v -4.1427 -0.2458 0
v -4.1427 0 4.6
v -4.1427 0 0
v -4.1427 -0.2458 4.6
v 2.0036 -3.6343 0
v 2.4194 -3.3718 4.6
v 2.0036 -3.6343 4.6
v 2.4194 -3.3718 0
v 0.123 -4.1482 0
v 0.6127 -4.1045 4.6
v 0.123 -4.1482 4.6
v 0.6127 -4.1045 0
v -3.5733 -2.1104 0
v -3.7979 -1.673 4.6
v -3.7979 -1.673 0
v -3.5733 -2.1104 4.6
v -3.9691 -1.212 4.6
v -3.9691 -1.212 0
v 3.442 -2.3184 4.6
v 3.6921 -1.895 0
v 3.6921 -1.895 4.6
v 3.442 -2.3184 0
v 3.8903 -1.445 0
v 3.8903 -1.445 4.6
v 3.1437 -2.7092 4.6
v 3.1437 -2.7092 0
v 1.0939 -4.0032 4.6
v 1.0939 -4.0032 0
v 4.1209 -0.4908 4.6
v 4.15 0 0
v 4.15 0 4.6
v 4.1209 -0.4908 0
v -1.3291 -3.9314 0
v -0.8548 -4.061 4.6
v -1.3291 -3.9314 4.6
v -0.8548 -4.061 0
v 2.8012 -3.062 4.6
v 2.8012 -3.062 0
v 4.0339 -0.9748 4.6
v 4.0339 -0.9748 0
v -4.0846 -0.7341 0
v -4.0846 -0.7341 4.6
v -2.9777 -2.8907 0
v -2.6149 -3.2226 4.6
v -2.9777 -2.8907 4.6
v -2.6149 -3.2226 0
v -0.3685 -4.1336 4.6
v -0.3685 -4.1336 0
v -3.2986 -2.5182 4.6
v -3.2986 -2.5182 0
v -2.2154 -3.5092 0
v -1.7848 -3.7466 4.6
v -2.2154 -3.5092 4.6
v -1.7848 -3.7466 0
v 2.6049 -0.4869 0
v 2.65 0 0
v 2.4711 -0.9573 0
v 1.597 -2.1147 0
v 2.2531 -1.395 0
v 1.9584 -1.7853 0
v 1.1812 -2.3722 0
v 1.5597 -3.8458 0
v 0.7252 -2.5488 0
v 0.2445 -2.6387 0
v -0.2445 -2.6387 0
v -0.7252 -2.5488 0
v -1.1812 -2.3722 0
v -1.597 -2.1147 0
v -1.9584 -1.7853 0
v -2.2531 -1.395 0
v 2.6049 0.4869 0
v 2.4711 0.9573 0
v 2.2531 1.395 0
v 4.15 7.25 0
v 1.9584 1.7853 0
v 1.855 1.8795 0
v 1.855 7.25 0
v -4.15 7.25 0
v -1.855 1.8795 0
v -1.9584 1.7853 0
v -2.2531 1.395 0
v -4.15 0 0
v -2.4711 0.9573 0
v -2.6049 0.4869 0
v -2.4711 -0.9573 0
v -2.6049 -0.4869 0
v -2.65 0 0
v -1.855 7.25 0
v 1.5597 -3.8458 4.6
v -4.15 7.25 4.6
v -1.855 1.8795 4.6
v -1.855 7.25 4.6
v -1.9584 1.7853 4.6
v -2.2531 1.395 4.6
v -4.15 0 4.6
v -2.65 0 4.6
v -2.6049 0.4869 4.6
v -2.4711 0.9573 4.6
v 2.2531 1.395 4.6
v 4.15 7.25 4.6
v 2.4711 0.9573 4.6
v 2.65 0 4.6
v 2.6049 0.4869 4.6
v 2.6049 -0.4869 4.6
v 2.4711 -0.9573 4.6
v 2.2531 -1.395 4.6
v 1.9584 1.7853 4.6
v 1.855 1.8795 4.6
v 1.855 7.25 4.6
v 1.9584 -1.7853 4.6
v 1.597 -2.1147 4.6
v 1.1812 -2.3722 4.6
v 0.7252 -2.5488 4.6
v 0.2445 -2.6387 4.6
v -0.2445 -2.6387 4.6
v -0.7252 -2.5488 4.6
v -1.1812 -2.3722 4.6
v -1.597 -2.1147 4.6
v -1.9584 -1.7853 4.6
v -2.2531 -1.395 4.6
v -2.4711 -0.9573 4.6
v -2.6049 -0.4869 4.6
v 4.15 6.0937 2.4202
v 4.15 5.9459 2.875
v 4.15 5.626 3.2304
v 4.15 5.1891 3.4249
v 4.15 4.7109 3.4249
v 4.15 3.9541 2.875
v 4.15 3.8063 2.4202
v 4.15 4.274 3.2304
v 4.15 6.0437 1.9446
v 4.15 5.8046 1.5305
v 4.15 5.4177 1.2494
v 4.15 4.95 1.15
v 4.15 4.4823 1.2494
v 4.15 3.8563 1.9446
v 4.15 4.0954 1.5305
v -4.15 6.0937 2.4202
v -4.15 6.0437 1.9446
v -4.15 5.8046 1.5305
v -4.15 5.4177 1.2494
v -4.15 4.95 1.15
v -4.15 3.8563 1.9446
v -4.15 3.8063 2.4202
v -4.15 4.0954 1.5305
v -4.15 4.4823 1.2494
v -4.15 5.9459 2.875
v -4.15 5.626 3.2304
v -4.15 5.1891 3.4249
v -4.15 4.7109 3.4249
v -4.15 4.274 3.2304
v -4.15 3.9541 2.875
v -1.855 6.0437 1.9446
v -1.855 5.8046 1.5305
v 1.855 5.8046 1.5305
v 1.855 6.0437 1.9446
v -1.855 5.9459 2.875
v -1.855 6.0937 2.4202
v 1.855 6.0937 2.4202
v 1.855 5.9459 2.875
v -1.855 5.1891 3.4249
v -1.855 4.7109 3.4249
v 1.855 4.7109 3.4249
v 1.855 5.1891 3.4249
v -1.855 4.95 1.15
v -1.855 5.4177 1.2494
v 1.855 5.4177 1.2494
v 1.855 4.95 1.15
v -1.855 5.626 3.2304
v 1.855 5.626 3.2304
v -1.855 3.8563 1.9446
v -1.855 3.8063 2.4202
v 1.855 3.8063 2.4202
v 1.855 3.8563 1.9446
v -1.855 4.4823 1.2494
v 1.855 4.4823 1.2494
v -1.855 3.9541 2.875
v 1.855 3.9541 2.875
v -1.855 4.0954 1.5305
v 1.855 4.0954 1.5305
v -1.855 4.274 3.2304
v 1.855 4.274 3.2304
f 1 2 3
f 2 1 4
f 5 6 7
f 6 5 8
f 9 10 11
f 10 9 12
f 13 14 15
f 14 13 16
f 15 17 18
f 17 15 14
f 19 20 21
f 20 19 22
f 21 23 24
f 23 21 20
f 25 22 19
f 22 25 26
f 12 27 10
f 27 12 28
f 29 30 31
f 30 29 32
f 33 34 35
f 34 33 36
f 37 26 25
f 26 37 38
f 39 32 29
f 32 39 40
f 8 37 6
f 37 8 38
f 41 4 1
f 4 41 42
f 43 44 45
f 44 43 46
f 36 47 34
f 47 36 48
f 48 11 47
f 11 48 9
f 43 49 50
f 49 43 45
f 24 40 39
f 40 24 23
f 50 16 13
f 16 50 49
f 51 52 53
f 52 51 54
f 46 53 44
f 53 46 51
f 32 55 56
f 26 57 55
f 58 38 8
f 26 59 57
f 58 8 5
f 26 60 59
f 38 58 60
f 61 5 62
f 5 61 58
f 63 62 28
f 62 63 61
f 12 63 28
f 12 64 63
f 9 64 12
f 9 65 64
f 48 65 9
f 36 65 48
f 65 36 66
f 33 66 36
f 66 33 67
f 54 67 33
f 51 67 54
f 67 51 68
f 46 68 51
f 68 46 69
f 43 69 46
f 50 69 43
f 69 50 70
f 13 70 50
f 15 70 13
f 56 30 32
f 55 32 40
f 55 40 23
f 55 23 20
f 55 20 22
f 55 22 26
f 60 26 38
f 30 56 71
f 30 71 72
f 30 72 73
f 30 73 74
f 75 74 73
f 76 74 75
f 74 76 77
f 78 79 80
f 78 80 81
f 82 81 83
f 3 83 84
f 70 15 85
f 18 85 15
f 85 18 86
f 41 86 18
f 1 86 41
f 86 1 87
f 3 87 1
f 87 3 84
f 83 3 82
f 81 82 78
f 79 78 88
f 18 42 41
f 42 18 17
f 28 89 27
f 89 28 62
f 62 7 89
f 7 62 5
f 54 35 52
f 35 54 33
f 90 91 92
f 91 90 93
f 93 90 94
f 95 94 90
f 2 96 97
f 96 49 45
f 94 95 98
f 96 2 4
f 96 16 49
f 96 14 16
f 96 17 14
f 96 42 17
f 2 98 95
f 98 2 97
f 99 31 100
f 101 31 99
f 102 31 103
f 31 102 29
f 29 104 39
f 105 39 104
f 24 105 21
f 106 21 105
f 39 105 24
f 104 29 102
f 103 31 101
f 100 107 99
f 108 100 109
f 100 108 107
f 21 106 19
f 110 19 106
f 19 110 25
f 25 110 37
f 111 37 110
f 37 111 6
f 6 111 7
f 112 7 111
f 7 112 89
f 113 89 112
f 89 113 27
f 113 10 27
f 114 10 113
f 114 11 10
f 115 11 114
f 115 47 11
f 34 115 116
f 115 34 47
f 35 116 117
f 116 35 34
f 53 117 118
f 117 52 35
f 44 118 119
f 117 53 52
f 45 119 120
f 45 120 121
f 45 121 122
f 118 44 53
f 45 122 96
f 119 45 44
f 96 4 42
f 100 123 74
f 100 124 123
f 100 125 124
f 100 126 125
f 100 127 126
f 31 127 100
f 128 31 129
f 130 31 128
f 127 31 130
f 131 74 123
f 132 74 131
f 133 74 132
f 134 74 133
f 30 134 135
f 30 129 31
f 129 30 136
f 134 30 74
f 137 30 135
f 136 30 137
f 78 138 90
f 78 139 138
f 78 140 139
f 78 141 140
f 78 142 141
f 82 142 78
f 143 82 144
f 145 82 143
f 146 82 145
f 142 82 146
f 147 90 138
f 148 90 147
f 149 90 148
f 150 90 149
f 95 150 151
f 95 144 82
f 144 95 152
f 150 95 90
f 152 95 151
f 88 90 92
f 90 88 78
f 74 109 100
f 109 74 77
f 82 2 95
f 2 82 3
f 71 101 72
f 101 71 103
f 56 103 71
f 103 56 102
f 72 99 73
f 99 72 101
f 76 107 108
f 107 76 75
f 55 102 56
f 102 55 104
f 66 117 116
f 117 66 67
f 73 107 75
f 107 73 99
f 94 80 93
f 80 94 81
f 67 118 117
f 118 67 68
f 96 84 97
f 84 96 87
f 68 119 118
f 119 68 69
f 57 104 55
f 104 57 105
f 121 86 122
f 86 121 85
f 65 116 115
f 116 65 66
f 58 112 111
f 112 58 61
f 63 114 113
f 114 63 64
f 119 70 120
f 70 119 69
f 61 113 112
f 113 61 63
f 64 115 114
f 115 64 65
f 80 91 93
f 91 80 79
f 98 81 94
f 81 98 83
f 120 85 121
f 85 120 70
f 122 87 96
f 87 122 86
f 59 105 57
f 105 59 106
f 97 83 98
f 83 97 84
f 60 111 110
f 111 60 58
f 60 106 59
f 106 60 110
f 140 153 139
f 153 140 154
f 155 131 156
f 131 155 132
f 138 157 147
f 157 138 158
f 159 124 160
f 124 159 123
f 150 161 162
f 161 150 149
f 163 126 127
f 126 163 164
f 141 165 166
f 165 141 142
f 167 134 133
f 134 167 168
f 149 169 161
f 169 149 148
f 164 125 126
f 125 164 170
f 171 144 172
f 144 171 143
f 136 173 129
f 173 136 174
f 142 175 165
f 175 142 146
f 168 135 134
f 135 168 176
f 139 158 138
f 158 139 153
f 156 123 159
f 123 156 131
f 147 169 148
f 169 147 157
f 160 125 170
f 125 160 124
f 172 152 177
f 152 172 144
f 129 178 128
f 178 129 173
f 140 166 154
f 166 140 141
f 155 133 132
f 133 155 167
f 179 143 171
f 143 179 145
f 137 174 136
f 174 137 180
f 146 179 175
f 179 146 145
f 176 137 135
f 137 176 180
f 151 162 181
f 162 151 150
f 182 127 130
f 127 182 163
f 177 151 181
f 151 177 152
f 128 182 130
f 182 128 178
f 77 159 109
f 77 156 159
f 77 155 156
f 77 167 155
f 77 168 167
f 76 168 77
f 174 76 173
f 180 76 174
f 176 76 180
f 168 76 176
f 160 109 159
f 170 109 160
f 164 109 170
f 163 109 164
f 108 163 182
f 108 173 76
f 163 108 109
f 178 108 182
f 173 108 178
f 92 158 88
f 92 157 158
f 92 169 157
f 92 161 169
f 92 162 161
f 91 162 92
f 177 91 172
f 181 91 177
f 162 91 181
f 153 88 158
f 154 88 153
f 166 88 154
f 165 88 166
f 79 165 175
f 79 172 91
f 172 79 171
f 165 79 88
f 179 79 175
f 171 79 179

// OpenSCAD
// parametric params
screw = 2.3;
iradius = 5.3/2;
oradius = iradius+1.5;
zfight = 1;

// derived params
clampWidthOffset = iradius*2*0.3; // 40% of the inner diameter
clampLength = iradius+screw*2;
clampCenter = clampLength-screw;

// resolution
$fa = 3;
$fs = 0.5;

height = screw*2;

difference()
{
    union()
    {
        cylinder(h=height, r=oradius);
        translate([-oradius, 0, 0]) cube([2*oradius, clampLength, height]);
    }
    union()
    {
        // post
        translate([0,0,-zfight]) cylinder(h=height+2*zfight, r=iradius);

        // screw
        translate([-oradius-zfight,clampCenter,height/2]) rotate([0,90,0]) cylinder(h=2*(oradius+zfight), d=screw);

        // cutout
        translate([clampWidthOffset/2-iradius, 0, -zfight]) cube([iradius*2-clampWidthOffset, clampLength+zfight, height+2*zfight]);
    }
}
